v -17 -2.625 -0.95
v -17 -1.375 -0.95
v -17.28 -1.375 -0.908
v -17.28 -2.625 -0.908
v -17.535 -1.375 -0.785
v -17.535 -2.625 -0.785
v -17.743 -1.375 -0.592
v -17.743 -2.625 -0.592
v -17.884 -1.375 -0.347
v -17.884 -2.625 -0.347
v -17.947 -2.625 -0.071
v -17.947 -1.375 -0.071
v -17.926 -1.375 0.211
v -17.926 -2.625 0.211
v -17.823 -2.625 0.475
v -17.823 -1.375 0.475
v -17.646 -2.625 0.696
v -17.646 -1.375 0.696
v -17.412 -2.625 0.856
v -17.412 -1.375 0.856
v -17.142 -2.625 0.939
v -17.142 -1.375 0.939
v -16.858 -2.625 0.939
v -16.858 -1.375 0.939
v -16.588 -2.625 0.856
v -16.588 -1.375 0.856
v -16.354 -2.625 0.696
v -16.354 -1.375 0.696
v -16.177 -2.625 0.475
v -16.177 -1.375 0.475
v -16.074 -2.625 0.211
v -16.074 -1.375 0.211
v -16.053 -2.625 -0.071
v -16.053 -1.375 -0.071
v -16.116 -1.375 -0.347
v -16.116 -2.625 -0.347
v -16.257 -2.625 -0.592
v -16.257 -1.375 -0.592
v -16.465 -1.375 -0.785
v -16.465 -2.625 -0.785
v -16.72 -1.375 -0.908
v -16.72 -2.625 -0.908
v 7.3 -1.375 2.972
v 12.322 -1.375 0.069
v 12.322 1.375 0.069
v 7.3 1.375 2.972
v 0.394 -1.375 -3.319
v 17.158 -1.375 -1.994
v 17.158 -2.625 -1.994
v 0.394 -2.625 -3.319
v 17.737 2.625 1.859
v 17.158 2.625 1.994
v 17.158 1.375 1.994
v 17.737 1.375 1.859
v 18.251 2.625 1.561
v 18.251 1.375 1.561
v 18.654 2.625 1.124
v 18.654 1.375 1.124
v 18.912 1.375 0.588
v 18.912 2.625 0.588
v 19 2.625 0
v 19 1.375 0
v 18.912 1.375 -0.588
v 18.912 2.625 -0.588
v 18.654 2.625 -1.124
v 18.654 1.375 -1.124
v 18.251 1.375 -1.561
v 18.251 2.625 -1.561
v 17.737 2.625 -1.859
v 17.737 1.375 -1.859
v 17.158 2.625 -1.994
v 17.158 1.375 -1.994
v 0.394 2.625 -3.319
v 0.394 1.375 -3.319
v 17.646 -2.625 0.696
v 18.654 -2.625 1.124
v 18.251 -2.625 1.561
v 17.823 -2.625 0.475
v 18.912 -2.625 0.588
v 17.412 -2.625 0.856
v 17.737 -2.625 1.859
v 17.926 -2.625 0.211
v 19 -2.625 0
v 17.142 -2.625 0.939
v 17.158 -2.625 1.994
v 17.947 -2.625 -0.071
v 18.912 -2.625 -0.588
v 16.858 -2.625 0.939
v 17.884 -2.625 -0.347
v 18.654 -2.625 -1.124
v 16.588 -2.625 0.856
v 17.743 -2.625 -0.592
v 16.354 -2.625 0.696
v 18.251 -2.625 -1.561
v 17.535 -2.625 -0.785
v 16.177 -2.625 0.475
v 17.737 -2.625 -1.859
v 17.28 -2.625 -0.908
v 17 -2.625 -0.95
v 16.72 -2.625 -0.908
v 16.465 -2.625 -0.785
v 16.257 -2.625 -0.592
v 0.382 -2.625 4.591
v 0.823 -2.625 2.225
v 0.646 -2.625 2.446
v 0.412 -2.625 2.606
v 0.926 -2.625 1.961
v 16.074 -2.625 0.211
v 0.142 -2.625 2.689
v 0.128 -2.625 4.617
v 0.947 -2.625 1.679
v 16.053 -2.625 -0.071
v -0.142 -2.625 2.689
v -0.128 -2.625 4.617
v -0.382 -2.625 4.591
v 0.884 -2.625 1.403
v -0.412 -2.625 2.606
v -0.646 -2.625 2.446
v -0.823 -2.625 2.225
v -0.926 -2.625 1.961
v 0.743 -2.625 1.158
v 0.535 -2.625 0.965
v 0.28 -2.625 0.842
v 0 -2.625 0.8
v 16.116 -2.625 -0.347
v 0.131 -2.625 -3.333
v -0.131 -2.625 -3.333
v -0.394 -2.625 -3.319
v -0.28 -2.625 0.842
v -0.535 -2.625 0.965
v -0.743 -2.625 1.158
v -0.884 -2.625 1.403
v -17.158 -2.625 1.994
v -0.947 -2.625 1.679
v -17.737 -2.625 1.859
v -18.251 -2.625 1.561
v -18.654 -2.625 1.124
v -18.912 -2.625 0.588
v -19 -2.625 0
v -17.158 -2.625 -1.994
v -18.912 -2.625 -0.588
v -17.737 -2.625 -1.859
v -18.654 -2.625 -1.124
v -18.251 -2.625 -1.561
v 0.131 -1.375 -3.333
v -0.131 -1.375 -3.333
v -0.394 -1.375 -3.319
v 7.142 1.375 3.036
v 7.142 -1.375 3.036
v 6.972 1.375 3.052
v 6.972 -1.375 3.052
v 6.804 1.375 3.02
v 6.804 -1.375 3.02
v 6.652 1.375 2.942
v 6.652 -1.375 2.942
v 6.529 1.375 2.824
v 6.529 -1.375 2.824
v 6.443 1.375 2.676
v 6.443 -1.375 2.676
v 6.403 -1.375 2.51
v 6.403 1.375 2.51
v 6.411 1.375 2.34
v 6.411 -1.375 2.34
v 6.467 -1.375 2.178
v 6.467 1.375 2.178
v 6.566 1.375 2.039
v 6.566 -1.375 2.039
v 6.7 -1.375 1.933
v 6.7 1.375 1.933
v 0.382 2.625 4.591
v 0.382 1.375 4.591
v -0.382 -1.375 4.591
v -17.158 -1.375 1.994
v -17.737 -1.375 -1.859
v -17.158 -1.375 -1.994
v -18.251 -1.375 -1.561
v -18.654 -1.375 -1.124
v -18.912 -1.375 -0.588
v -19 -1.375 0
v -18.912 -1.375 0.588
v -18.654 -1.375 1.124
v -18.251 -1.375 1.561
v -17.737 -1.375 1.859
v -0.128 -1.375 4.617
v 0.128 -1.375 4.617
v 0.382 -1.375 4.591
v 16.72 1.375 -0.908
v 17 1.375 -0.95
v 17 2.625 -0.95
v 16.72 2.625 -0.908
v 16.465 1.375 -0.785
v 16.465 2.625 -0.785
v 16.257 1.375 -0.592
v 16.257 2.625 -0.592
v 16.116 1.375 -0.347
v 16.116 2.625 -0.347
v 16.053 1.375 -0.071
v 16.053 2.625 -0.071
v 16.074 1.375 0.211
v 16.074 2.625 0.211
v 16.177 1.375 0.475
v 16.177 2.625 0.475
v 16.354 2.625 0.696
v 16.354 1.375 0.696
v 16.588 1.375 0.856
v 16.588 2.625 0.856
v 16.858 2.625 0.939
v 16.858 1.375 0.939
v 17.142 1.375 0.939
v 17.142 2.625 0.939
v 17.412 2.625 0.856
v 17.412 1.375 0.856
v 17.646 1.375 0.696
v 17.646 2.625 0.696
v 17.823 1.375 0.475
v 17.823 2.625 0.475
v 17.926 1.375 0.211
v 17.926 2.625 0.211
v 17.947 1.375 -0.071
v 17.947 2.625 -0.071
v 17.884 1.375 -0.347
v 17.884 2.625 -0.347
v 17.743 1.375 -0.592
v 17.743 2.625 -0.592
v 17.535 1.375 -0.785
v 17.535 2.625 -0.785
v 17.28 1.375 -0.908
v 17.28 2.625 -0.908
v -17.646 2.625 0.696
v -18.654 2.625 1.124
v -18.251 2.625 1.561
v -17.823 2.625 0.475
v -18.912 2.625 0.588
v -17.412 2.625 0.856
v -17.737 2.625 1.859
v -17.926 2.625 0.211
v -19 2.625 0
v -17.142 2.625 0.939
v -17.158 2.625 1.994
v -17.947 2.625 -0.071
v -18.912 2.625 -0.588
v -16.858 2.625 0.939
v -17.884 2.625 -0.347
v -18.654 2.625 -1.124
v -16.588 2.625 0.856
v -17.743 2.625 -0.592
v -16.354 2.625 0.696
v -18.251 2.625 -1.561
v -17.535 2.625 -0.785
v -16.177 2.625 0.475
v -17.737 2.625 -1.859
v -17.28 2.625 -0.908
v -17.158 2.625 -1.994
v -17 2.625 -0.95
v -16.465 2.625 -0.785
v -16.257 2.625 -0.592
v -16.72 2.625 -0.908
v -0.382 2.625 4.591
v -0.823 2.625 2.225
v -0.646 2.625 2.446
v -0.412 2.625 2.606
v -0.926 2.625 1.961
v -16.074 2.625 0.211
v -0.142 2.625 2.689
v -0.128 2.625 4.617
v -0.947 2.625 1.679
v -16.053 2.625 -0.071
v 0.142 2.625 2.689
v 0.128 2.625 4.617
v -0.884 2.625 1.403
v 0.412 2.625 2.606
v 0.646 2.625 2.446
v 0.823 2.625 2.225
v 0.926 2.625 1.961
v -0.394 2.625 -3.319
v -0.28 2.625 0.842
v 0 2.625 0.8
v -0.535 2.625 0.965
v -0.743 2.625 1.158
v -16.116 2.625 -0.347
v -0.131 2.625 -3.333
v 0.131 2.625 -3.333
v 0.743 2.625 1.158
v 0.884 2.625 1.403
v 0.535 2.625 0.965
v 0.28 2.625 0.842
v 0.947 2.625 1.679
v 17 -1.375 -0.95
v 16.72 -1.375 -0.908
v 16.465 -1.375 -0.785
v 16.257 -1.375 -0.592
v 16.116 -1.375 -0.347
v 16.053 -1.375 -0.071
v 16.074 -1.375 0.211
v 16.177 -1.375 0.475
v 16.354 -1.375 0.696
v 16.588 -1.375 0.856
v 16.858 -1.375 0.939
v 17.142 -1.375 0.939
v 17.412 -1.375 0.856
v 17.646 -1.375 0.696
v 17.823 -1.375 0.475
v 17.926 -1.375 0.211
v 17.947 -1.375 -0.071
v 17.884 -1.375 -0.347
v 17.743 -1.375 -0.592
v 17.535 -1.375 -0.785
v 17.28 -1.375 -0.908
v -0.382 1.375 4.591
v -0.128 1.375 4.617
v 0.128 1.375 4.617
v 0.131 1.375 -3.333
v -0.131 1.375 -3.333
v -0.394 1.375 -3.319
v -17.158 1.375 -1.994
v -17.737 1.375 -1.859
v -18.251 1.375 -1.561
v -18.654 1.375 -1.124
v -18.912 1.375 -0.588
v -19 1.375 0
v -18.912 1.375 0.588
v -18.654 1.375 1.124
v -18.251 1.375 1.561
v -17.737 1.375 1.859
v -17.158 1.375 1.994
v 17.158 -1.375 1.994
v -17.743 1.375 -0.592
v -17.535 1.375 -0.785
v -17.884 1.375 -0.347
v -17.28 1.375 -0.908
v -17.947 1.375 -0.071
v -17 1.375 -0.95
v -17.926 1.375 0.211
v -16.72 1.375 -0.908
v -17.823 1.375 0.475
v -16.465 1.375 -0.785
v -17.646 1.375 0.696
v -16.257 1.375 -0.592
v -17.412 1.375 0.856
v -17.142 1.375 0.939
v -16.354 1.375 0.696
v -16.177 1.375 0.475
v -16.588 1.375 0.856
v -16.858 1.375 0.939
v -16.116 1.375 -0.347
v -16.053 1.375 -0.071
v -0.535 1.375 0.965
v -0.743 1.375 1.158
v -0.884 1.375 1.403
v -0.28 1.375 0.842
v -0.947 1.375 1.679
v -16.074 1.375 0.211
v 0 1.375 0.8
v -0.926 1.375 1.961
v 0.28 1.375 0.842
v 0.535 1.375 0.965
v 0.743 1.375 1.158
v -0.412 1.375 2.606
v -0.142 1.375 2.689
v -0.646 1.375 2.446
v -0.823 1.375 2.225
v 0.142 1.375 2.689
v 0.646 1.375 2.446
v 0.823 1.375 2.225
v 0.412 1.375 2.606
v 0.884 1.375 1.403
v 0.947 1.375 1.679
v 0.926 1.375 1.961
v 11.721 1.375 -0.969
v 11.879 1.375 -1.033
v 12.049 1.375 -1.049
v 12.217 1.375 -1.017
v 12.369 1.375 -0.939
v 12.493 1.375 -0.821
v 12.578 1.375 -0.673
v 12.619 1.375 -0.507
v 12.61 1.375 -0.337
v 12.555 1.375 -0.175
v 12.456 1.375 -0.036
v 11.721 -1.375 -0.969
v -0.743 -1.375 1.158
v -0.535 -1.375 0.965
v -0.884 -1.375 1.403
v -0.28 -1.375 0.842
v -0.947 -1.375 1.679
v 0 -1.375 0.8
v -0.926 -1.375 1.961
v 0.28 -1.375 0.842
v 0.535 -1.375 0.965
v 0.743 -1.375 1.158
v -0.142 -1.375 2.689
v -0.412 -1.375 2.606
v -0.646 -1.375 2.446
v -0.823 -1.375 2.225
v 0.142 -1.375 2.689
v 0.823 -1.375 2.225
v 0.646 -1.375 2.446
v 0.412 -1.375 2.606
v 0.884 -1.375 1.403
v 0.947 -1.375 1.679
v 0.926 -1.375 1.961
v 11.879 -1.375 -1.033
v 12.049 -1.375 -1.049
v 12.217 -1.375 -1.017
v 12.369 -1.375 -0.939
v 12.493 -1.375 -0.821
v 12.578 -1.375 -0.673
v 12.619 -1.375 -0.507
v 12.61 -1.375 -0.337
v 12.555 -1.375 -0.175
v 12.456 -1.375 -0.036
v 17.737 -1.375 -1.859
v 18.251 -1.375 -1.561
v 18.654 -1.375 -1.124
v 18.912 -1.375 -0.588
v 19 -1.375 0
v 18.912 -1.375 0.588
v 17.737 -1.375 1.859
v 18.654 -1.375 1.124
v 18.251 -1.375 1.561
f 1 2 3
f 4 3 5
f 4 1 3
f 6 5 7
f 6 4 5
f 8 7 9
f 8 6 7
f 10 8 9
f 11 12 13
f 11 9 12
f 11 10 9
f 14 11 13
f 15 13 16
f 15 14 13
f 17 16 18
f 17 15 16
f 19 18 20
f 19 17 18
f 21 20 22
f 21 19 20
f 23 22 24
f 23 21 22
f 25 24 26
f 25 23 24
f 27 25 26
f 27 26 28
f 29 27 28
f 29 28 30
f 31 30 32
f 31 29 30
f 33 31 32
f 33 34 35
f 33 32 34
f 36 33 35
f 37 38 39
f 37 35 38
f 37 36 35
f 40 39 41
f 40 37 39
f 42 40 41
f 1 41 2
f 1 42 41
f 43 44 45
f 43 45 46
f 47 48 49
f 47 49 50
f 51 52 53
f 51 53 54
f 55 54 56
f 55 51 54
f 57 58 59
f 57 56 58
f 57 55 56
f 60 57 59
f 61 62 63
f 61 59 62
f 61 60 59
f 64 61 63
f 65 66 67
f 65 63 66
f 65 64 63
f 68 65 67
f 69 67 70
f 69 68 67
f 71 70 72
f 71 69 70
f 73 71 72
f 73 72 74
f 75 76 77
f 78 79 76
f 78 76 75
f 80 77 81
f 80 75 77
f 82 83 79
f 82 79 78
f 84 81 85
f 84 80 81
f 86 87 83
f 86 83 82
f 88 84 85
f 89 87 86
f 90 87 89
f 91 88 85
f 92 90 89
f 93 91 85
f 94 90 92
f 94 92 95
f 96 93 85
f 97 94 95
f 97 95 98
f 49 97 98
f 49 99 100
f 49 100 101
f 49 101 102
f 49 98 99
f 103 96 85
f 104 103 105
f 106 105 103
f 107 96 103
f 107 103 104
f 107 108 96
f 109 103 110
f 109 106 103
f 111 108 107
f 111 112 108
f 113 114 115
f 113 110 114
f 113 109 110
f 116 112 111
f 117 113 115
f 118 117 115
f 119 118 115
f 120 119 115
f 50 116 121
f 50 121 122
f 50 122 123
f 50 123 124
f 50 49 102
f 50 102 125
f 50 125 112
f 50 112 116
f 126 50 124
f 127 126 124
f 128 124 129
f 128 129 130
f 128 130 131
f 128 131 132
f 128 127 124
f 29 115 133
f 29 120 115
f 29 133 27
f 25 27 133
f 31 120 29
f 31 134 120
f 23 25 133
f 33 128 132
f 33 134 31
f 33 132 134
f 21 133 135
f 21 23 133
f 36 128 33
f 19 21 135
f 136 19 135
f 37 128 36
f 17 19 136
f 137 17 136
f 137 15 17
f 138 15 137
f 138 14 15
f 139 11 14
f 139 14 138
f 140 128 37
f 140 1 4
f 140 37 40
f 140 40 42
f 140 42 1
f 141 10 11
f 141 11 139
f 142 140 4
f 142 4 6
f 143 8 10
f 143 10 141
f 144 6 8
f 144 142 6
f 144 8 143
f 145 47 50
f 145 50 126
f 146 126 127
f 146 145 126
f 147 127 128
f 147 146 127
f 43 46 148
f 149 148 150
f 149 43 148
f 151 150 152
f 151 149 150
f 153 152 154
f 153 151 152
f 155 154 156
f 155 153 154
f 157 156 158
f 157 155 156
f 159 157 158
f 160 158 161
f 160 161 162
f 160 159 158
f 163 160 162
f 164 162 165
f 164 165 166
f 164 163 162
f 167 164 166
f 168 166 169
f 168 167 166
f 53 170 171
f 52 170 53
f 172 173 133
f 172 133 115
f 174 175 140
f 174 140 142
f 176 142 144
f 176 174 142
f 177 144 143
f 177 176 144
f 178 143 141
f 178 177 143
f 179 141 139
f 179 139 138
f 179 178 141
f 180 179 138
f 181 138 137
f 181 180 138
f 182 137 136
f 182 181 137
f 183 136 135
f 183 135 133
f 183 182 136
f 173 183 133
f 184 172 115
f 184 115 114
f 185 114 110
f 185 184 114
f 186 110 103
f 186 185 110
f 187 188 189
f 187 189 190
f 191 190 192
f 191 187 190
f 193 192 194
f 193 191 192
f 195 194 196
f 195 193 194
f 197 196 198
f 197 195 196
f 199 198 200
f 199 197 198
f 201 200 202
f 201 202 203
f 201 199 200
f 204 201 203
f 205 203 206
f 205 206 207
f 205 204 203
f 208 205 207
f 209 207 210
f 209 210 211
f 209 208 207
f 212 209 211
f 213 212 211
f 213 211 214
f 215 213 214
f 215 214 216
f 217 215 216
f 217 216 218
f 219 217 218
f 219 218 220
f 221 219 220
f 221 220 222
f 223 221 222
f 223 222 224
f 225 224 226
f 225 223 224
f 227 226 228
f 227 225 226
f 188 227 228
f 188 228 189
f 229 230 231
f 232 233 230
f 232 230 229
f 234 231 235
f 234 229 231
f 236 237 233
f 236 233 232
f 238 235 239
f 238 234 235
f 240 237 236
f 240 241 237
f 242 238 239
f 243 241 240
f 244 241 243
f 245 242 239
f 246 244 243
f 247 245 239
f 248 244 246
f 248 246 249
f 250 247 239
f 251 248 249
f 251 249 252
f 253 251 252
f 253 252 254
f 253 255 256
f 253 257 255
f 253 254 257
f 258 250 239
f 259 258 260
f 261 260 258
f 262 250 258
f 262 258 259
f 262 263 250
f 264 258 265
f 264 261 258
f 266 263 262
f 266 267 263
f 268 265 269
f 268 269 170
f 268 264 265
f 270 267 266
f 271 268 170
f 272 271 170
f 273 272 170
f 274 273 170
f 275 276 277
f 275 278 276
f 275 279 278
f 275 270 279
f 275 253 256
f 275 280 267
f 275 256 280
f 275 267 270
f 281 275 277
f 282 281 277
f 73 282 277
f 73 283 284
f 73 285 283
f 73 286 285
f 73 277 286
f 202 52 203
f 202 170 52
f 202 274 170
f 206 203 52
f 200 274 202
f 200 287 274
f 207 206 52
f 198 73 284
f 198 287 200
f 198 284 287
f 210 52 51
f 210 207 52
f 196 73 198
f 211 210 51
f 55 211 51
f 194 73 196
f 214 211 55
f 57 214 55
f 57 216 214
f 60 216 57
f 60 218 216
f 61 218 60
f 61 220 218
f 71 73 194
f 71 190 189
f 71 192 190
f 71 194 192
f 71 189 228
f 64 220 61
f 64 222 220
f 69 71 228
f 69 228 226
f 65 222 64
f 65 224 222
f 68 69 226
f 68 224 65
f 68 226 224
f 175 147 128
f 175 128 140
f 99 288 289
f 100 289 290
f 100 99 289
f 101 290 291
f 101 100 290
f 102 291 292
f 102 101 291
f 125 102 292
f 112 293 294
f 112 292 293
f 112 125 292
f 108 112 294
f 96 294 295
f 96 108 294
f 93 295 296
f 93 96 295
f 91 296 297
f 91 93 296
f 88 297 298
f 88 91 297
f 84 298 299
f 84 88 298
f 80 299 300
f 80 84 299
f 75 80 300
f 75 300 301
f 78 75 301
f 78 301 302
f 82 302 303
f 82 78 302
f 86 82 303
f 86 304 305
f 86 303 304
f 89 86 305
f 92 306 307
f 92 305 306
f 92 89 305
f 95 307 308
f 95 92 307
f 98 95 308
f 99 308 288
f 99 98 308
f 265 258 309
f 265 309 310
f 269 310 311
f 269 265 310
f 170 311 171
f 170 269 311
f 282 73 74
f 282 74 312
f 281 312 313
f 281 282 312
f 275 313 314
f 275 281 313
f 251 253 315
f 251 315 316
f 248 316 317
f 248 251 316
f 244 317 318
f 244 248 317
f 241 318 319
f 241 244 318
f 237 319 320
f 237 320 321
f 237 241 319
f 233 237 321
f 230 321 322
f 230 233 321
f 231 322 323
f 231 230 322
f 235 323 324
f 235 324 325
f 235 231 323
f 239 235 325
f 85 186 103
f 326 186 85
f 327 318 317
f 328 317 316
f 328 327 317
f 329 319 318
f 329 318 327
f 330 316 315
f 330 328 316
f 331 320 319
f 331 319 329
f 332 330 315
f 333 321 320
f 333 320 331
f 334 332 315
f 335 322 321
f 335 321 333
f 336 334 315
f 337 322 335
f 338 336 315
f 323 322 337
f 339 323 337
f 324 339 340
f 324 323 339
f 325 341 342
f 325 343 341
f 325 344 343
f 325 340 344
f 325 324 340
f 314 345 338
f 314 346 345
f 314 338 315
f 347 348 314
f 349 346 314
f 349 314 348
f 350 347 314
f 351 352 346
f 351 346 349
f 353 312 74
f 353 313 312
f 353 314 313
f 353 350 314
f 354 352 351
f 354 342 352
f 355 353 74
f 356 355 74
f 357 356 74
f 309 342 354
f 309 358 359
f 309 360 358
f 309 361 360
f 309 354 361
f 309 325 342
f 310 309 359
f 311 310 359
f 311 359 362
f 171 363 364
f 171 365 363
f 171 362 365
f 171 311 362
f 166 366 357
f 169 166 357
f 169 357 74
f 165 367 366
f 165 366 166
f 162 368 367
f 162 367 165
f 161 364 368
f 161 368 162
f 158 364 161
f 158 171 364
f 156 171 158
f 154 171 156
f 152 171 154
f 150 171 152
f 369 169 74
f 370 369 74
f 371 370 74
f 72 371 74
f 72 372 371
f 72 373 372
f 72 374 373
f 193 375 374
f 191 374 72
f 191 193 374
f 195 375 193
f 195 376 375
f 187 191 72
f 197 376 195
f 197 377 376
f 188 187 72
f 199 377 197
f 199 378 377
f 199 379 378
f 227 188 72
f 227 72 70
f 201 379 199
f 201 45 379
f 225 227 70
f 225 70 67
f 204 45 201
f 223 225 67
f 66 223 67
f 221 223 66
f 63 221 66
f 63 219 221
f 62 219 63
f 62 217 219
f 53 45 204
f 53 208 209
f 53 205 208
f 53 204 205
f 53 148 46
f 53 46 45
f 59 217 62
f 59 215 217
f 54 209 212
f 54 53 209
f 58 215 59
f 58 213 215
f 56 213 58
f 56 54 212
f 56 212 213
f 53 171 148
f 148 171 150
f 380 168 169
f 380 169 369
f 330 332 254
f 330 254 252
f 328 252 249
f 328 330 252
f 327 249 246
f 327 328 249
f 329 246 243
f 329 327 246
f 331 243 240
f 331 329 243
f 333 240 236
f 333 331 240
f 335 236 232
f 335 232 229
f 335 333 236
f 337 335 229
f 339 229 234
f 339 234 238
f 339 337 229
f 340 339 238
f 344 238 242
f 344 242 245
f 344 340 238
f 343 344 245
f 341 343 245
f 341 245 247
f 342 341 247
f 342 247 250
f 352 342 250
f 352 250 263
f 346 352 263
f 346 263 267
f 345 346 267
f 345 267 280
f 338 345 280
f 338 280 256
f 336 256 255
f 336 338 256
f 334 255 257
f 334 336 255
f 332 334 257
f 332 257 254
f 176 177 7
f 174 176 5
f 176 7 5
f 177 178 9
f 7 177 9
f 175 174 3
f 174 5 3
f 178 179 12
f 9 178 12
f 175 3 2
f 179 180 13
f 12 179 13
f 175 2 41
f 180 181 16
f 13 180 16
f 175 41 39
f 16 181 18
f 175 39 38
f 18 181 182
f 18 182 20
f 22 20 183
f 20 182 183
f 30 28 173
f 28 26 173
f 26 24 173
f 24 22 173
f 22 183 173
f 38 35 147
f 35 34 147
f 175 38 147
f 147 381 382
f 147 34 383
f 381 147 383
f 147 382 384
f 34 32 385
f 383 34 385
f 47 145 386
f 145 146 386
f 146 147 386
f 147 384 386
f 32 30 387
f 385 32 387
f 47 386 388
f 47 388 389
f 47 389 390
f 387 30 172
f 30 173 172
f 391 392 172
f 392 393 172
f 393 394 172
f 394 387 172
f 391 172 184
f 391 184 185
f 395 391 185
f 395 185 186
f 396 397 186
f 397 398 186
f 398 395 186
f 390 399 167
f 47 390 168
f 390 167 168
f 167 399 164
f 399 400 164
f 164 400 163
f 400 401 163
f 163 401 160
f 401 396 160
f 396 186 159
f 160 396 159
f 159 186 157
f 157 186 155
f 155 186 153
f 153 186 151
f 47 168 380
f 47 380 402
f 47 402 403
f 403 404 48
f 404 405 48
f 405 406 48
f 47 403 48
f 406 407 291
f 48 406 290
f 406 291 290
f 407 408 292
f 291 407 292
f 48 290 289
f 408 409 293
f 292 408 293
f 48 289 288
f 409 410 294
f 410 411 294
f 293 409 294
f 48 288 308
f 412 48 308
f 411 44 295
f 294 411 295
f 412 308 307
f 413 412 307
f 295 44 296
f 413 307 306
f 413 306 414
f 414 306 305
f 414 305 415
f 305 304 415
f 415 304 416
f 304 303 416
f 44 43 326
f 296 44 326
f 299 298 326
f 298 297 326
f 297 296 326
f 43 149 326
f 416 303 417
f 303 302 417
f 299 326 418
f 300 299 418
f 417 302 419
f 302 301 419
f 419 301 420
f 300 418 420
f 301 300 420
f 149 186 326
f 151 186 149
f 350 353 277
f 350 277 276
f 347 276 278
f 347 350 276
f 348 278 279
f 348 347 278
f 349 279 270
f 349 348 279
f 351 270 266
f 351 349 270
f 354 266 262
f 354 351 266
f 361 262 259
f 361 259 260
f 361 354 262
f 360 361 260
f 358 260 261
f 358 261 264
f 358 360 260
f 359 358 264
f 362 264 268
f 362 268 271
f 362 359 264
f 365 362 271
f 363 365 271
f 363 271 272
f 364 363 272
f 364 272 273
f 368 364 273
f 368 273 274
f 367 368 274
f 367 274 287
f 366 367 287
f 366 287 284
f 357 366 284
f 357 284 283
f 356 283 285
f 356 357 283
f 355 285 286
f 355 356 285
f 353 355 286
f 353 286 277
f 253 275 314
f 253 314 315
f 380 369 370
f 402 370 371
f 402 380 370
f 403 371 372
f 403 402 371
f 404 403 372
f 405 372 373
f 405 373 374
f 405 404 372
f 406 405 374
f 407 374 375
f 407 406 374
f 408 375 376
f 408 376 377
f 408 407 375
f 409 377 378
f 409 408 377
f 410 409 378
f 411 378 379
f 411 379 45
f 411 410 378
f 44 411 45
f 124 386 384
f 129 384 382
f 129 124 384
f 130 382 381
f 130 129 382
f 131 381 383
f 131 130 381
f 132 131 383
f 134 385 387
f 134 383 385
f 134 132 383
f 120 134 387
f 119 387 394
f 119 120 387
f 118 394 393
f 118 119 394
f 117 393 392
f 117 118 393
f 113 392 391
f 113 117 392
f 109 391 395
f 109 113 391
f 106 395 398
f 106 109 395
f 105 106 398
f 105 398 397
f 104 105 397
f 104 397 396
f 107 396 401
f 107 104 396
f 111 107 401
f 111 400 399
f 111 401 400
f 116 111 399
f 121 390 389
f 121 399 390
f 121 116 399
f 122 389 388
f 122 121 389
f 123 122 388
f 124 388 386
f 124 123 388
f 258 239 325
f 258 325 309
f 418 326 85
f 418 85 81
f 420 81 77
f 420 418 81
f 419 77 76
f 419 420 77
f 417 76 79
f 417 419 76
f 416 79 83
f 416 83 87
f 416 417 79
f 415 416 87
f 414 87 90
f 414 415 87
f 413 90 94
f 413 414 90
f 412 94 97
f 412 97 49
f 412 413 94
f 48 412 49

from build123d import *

# Parameters (mm, degrees)
SKETCH1_R                = 0.95
BOSS_EXTRUDE1_DEPTH      = 2.625
SKETCH3_W                = 38
SKETCH3_H                = 2.75
CUT_EXTRUDE1_DEPTH       = 5
BOSS_EXTRUDE3_DEPTH      = 1.375
BOSS_EXTRUDE3_DEPTH_BACK = 2.625


with BuildPart() as part:
    # Sketch1 → Boss-Extrude1 (new, symmetric)
    with BuildSketch(Plane(origin=(0, 0, 0), x_dir=(1, 0, 0), z_dir=(0, 1, 0))):
        with BuildLine():
            Line((-0.393995074, 3.318856737), (-17.15759803, 1.993781046))
            ThreePointArc((-17.15759803, 1.993781046), (-19, 0), (-17.15759803, -1.993781046))
            Line((-17.15759803, -1.993781046), (-0.382476184, -4.590787721))
            ThreePointArc((-0.382476184, -4.590787721), (0, -4.620218562), (0.382476184, -4.590787721))
            Line((0.382476184, -4.590787721), (17.15759803, -1.993781046))
            ThreePointArc((17.15759803, -1.993781046), (19, 0), (17.15759803, 1.993781046))
            Line((17.15759803, 1.993781046), (0.393995074, 3.318856737))
            ThreePointArc((0.393995074, 3.318856737), (0, 3.334404121), (-0.393995074, 3.318856737))
        make_face()
        with Locations(Location((-17, 0, 0), (0, 0, 90))):
            Circle(SKETCH1_R, mode=Mode.SUBTRACT)
        with Locations(Location((17, 0, 0), (0, 0, 90))):
            Circle(SKETCH1_R, mode=Mode.SUBTRACT)
        with Locations(Location((0, -1.75, 0), (0, 0, 90))):
            Circle(SKETCH1_R, mode=Mode.SUBTRACT)
    extrude(amount=BOSS_EXTRUDE1_DEPTH, both=True)

    # Sketch3 → Cut-Extrude1 (cut, symmetric)
    with BuildSketch(Plane.XY):
        Rectangle(SKETCH3_W, SKETCH3_H)
    extrude(amount=CUT_EXTRUDE1_DEPTH, both=True, mode=Mode.SUBTRACT)


with BuildPart() as cut_extrude1_piece_1:
    # of the separate pieces the step leaves, piece 1, a body of its own (cut_extrude1_pieces)
    add(part.part.solids().sort_by_distance((0.393995074, -1.375, -3.318856737))[0])



with BuildPart() as cut_extrude1_piece_2:
    # of the separate pieces the step leaves, piece 2, a body of its own (cut_extrude1_pieces)
    add(part.part.solids().sort_by_distance((0.393995074, 2.625, -3.318856737))[0])


with BuildPart() as cut_extrude1_piece_1_1:
    add(cut_extrude1_piece_1.part)

    add(cut_extrude1_piece_2.part)  # Boss-Extrude3 merges Cut-Extrude1 piece 2
    # Sketch4 → Boss-Extrude3 (add, two sides: drawn at the far end of the back side and taken through both)
    with BuildSketch(Plane(origin=(0, 0, 0), x_dir=(1, 0, 0), z_dir=(0, 1, 0)).offset(-BOSS_EXTRUDE3_DEPTH_BACK)):
        with BuildLine():
            Line((6.699698425, -1.933474209), (11.720961536, 0.969441011))
            ThreePointArc((11.720961536, 0.969441011), (12.540704122, 0.750301575), (12.321564685, -0.069441011))
            Line((12.321564685, -0.069441011), (7.300301575, -2.972356232))
            ThreePointArc((7.300301575, -2.972356232), (6.480558989, -2.753216795), (6.699698425, -1.933474209))
        make_face()
    extrude(amount=BOSS_EXTRUDE3_DEPTH + BOSS_EXTRUDE3_DEPTH_BACK)


solid = cut_extrude1_piece_1_1.part
